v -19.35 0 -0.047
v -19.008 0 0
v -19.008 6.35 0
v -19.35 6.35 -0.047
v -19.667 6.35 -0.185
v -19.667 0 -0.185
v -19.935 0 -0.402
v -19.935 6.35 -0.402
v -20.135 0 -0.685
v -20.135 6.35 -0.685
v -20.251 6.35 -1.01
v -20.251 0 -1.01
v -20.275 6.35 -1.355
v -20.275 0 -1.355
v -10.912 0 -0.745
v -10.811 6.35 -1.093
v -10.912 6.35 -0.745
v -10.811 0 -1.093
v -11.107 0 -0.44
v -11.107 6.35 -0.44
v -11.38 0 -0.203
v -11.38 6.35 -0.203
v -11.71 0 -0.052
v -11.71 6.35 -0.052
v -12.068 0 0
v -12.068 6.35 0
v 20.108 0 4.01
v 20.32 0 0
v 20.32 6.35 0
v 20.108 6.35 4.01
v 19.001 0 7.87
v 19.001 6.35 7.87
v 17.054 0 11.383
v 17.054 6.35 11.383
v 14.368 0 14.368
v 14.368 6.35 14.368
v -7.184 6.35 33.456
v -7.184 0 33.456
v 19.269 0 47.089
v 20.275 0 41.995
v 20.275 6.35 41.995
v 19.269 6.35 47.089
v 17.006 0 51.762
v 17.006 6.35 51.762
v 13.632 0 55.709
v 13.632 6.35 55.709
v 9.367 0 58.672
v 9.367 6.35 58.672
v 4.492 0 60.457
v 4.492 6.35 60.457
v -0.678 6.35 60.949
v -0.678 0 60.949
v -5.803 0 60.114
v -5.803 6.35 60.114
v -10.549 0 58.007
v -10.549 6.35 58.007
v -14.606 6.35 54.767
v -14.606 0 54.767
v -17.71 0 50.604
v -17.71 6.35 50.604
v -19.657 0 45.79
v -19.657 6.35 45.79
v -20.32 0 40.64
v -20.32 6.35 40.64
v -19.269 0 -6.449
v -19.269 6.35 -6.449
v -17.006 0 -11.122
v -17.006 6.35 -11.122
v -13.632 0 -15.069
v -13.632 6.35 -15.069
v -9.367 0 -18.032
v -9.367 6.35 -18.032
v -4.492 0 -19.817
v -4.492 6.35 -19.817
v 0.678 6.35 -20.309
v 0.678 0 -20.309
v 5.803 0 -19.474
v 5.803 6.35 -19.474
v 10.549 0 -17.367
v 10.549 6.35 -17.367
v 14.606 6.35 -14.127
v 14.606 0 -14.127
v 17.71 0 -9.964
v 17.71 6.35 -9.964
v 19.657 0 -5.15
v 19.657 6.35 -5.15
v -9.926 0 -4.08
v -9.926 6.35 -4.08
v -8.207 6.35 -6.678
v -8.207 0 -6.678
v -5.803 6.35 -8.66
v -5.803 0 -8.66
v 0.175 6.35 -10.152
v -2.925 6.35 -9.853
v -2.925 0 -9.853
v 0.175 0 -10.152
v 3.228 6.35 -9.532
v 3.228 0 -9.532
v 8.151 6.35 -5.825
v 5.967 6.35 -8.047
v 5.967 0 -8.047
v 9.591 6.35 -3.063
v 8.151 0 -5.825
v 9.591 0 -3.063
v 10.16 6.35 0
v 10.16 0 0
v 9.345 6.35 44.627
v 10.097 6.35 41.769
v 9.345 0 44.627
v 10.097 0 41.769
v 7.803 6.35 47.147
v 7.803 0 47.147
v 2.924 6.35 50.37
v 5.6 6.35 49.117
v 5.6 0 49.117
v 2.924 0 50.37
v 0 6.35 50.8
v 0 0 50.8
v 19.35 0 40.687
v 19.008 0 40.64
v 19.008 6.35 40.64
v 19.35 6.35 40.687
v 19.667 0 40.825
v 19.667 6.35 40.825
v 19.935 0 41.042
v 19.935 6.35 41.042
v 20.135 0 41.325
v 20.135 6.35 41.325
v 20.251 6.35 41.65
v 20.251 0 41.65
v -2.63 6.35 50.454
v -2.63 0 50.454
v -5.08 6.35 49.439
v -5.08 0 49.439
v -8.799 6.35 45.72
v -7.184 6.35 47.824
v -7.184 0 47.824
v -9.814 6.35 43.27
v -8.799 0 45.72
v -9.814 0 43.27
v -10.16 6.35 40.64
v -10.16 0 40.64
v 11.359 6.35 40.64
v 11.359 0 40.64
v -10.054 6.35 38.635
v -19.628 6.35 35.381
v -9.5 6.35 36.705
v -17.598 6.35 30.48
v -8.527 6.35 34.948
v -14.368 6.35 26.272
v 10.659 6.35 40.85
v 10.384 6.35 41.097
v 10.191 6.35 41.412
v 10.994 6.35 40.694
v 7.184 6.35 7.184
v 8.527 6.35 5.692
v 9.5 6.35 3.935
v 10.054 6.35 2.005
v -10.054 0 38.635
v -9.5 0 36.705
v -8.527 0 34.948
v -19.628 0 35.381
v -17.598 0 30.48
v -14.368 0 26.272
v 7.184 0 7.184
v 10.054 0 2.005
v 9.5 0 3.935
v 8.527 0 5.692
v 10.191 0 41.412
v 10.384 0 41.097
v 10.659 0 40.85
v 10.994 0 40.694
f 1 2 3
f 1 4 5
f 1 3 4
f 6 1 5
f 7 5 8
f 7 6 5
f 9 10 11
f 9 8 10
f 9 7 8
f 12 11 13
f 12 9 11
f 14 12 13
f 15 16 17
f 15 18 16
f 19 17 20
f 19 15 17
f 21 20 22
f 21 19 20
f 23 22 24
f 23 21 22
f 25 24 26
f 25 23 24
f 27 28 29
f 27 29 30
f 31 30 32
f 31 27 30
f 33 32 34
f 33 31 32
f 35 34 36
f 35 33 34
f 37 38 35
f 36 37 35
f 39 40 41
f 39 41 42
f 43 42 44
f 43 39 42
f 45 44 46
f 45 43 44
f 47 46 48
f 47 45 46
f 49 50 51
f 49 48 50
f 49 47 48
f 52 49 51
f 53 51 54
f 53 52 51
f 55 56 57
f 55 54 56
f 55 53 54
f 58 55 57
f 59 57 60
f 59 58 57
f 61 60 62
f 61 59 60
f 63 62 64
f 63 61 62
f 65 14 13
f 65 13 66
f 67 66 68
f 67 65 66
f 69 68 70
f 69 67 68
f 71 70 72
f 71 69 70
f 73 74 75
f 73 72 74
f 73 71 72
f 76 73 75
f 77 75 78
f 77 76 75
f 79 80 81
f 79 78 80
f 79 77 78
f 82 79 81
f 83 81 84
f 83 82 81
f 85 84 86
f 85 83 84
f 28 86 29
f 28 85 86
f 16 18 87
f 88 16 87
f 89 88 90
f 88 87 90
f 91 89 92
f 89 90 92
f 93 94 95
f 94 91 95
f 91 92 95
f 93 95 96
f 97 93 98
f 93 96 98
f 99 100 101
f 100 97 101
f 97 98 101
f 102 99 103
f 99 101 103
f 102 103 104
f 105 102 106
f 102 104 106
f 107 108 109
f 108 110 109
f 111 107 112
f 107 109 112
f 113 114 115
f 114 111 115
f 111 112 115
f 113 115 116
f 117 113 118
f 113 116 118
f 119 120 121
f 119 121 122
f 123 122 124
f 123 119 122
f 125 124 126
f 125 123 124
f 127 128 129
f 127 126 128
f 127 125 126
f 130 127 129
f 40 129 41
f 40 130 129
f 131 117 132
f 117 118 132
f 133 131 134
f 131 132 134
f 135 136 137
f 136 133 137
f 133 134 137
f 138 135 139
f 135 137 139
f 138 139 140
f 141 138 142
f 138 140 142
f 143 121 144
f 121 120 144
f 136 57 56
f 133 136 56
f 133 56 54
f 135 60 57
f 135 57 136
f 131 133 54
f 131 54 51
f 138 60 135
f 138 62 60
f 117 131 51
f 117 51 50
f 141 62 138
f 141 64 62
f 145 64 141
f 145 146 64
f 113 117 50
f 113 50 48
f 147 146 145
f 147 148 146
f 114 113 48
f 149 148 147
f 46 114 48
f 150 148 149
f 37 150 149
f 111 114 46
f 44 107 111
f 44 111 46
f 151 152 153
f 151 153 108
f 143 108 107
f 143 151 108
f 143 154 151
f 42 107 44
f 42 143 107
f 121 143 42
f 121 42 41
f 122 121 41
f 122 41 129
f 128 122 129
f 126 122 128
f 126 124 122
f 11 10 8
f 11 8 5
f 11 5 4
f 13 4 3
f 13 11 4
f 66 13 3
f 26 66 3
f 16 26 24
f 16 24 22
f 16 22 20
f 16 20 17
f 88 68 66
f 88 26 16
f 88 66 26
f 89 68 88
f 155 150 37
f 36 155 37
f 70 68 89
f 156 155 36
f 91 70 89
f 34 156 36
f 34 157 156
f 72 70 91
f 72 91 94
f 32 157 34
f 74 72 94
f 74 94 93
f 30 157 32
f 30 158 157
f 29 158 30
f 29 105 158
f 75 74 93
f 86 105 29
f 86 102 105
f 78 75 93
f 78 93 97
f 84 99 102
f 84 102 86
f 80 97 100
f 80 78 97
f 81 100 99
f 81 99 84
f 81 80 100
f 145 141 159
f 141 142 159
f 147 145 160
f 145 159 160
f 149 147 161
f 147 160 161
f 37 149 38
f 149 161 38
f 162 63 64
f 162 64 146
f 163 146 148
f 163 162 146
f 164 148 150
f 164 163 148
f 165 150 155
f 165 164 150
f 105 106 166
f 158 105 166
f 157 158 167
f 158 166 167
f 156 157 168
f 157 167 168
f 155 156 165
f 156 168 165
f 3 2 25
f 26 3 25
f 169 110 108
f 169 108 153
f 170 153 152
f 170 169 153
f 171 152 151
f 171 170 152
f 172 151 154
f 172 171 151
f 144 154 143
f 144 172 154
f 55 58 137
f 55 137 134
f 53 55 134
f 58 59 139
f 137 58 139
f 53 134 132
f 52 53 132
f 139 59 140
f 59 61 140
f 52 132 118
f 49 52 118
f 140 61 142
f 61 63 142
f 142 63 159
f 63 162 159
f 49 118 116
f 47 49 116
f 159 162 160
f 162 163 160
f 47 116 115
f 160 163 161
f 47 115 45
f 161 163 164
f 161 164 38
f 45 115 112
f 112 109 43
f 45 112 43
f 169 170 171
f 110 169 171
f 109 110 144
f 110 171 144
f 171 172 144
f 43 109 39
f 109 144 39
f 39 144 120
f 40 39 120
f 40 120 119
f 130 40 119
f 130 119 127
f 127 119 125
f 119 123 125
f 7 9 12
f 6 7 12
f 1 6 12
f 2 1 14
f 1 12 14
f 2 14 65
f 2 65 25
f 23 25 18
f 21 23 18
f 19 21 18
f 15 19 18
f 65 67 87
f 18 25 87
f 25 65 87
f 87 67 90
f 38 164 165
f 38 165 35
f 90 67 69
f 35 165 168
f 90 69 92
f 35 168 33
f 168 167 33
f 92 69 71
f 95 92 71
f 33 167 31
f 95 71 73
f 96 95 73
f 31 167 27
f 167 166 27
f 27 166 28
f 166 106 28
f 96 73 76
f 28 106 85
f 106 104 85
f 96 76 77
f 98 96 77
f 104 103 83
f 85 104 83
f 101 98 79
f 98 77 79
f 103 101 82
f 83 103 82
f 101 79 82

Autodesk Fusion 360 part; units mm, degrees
sketch "Sketch1" plane through (0, 0, 0) normal (0, 1, 0) x (1, 0, 0)
  line L0 (-19.0076, 0) -> (-12.0684, 0)
  arc A0 (10.16, 0) -> (-10.8108, 1.0933) centre (-0.3734, -0.3734) ccw
  line L1 (0, -40.64) -> (0, -50.8)
  line L2 (19.0076, -40.64) -> (11.3592, -40.64)
  arc A1 (-10.16, -40.64) -> (10.0971, -41.7689) centre (0, -40.64) ccw
  line L3 (-14.3684, -26.2716) -> (7.1842, -7.1842)
  line L4 (-7.1842, -33.4558) -> (14.3684, -14.3684)
  arc A2 (7.1842, -7.1842) -> (10.16, 0) centre (1.2978, -0.5376) ccw
  arc A3 (20.32, 0) -> (-20.2748, 1.3547) centre (0, 0) ccw
  arc A4 (-20.32, -40.64) -> (20.2748, -41.9947) centre (0, -40.64) ccw
  arc A5 (14.3684, -14.3684) -> (20.32, 0) centre (2.5957, -1.0752) ccw
  arc A6 (-7.1842, -33.4558) -> (-10.16, -40.64) centre (-1.2978, -40.1024) ccw
  arc A7 (-14.3684, -26.2716) -> (-20.32, -40.64) centre (0, -40.64) ccw
  arc A8 (20.2748, -41.9947) -> (19.0076, -40.64) centre (19.0076, -41.91) ccw
  arc A9 (11.3592, -40.64) -> (10.0971, -41.7689) centre (11.3592, -41.91) ccw
  arc A10 (-20.2748, 1.3547) -> (-19.0076, 0) centre (-19.0076, 1.27) ccw
  arc A11 (-12.0684, 0) -> (-10.8108, 1.0933) centre (-12.0684, 1.27) ccw
  dimension "d11" = 10.16
  dimension "d15" = 1.27
extrude "Extrude1" add sketch "Sketch1" along normal blind 6.35
